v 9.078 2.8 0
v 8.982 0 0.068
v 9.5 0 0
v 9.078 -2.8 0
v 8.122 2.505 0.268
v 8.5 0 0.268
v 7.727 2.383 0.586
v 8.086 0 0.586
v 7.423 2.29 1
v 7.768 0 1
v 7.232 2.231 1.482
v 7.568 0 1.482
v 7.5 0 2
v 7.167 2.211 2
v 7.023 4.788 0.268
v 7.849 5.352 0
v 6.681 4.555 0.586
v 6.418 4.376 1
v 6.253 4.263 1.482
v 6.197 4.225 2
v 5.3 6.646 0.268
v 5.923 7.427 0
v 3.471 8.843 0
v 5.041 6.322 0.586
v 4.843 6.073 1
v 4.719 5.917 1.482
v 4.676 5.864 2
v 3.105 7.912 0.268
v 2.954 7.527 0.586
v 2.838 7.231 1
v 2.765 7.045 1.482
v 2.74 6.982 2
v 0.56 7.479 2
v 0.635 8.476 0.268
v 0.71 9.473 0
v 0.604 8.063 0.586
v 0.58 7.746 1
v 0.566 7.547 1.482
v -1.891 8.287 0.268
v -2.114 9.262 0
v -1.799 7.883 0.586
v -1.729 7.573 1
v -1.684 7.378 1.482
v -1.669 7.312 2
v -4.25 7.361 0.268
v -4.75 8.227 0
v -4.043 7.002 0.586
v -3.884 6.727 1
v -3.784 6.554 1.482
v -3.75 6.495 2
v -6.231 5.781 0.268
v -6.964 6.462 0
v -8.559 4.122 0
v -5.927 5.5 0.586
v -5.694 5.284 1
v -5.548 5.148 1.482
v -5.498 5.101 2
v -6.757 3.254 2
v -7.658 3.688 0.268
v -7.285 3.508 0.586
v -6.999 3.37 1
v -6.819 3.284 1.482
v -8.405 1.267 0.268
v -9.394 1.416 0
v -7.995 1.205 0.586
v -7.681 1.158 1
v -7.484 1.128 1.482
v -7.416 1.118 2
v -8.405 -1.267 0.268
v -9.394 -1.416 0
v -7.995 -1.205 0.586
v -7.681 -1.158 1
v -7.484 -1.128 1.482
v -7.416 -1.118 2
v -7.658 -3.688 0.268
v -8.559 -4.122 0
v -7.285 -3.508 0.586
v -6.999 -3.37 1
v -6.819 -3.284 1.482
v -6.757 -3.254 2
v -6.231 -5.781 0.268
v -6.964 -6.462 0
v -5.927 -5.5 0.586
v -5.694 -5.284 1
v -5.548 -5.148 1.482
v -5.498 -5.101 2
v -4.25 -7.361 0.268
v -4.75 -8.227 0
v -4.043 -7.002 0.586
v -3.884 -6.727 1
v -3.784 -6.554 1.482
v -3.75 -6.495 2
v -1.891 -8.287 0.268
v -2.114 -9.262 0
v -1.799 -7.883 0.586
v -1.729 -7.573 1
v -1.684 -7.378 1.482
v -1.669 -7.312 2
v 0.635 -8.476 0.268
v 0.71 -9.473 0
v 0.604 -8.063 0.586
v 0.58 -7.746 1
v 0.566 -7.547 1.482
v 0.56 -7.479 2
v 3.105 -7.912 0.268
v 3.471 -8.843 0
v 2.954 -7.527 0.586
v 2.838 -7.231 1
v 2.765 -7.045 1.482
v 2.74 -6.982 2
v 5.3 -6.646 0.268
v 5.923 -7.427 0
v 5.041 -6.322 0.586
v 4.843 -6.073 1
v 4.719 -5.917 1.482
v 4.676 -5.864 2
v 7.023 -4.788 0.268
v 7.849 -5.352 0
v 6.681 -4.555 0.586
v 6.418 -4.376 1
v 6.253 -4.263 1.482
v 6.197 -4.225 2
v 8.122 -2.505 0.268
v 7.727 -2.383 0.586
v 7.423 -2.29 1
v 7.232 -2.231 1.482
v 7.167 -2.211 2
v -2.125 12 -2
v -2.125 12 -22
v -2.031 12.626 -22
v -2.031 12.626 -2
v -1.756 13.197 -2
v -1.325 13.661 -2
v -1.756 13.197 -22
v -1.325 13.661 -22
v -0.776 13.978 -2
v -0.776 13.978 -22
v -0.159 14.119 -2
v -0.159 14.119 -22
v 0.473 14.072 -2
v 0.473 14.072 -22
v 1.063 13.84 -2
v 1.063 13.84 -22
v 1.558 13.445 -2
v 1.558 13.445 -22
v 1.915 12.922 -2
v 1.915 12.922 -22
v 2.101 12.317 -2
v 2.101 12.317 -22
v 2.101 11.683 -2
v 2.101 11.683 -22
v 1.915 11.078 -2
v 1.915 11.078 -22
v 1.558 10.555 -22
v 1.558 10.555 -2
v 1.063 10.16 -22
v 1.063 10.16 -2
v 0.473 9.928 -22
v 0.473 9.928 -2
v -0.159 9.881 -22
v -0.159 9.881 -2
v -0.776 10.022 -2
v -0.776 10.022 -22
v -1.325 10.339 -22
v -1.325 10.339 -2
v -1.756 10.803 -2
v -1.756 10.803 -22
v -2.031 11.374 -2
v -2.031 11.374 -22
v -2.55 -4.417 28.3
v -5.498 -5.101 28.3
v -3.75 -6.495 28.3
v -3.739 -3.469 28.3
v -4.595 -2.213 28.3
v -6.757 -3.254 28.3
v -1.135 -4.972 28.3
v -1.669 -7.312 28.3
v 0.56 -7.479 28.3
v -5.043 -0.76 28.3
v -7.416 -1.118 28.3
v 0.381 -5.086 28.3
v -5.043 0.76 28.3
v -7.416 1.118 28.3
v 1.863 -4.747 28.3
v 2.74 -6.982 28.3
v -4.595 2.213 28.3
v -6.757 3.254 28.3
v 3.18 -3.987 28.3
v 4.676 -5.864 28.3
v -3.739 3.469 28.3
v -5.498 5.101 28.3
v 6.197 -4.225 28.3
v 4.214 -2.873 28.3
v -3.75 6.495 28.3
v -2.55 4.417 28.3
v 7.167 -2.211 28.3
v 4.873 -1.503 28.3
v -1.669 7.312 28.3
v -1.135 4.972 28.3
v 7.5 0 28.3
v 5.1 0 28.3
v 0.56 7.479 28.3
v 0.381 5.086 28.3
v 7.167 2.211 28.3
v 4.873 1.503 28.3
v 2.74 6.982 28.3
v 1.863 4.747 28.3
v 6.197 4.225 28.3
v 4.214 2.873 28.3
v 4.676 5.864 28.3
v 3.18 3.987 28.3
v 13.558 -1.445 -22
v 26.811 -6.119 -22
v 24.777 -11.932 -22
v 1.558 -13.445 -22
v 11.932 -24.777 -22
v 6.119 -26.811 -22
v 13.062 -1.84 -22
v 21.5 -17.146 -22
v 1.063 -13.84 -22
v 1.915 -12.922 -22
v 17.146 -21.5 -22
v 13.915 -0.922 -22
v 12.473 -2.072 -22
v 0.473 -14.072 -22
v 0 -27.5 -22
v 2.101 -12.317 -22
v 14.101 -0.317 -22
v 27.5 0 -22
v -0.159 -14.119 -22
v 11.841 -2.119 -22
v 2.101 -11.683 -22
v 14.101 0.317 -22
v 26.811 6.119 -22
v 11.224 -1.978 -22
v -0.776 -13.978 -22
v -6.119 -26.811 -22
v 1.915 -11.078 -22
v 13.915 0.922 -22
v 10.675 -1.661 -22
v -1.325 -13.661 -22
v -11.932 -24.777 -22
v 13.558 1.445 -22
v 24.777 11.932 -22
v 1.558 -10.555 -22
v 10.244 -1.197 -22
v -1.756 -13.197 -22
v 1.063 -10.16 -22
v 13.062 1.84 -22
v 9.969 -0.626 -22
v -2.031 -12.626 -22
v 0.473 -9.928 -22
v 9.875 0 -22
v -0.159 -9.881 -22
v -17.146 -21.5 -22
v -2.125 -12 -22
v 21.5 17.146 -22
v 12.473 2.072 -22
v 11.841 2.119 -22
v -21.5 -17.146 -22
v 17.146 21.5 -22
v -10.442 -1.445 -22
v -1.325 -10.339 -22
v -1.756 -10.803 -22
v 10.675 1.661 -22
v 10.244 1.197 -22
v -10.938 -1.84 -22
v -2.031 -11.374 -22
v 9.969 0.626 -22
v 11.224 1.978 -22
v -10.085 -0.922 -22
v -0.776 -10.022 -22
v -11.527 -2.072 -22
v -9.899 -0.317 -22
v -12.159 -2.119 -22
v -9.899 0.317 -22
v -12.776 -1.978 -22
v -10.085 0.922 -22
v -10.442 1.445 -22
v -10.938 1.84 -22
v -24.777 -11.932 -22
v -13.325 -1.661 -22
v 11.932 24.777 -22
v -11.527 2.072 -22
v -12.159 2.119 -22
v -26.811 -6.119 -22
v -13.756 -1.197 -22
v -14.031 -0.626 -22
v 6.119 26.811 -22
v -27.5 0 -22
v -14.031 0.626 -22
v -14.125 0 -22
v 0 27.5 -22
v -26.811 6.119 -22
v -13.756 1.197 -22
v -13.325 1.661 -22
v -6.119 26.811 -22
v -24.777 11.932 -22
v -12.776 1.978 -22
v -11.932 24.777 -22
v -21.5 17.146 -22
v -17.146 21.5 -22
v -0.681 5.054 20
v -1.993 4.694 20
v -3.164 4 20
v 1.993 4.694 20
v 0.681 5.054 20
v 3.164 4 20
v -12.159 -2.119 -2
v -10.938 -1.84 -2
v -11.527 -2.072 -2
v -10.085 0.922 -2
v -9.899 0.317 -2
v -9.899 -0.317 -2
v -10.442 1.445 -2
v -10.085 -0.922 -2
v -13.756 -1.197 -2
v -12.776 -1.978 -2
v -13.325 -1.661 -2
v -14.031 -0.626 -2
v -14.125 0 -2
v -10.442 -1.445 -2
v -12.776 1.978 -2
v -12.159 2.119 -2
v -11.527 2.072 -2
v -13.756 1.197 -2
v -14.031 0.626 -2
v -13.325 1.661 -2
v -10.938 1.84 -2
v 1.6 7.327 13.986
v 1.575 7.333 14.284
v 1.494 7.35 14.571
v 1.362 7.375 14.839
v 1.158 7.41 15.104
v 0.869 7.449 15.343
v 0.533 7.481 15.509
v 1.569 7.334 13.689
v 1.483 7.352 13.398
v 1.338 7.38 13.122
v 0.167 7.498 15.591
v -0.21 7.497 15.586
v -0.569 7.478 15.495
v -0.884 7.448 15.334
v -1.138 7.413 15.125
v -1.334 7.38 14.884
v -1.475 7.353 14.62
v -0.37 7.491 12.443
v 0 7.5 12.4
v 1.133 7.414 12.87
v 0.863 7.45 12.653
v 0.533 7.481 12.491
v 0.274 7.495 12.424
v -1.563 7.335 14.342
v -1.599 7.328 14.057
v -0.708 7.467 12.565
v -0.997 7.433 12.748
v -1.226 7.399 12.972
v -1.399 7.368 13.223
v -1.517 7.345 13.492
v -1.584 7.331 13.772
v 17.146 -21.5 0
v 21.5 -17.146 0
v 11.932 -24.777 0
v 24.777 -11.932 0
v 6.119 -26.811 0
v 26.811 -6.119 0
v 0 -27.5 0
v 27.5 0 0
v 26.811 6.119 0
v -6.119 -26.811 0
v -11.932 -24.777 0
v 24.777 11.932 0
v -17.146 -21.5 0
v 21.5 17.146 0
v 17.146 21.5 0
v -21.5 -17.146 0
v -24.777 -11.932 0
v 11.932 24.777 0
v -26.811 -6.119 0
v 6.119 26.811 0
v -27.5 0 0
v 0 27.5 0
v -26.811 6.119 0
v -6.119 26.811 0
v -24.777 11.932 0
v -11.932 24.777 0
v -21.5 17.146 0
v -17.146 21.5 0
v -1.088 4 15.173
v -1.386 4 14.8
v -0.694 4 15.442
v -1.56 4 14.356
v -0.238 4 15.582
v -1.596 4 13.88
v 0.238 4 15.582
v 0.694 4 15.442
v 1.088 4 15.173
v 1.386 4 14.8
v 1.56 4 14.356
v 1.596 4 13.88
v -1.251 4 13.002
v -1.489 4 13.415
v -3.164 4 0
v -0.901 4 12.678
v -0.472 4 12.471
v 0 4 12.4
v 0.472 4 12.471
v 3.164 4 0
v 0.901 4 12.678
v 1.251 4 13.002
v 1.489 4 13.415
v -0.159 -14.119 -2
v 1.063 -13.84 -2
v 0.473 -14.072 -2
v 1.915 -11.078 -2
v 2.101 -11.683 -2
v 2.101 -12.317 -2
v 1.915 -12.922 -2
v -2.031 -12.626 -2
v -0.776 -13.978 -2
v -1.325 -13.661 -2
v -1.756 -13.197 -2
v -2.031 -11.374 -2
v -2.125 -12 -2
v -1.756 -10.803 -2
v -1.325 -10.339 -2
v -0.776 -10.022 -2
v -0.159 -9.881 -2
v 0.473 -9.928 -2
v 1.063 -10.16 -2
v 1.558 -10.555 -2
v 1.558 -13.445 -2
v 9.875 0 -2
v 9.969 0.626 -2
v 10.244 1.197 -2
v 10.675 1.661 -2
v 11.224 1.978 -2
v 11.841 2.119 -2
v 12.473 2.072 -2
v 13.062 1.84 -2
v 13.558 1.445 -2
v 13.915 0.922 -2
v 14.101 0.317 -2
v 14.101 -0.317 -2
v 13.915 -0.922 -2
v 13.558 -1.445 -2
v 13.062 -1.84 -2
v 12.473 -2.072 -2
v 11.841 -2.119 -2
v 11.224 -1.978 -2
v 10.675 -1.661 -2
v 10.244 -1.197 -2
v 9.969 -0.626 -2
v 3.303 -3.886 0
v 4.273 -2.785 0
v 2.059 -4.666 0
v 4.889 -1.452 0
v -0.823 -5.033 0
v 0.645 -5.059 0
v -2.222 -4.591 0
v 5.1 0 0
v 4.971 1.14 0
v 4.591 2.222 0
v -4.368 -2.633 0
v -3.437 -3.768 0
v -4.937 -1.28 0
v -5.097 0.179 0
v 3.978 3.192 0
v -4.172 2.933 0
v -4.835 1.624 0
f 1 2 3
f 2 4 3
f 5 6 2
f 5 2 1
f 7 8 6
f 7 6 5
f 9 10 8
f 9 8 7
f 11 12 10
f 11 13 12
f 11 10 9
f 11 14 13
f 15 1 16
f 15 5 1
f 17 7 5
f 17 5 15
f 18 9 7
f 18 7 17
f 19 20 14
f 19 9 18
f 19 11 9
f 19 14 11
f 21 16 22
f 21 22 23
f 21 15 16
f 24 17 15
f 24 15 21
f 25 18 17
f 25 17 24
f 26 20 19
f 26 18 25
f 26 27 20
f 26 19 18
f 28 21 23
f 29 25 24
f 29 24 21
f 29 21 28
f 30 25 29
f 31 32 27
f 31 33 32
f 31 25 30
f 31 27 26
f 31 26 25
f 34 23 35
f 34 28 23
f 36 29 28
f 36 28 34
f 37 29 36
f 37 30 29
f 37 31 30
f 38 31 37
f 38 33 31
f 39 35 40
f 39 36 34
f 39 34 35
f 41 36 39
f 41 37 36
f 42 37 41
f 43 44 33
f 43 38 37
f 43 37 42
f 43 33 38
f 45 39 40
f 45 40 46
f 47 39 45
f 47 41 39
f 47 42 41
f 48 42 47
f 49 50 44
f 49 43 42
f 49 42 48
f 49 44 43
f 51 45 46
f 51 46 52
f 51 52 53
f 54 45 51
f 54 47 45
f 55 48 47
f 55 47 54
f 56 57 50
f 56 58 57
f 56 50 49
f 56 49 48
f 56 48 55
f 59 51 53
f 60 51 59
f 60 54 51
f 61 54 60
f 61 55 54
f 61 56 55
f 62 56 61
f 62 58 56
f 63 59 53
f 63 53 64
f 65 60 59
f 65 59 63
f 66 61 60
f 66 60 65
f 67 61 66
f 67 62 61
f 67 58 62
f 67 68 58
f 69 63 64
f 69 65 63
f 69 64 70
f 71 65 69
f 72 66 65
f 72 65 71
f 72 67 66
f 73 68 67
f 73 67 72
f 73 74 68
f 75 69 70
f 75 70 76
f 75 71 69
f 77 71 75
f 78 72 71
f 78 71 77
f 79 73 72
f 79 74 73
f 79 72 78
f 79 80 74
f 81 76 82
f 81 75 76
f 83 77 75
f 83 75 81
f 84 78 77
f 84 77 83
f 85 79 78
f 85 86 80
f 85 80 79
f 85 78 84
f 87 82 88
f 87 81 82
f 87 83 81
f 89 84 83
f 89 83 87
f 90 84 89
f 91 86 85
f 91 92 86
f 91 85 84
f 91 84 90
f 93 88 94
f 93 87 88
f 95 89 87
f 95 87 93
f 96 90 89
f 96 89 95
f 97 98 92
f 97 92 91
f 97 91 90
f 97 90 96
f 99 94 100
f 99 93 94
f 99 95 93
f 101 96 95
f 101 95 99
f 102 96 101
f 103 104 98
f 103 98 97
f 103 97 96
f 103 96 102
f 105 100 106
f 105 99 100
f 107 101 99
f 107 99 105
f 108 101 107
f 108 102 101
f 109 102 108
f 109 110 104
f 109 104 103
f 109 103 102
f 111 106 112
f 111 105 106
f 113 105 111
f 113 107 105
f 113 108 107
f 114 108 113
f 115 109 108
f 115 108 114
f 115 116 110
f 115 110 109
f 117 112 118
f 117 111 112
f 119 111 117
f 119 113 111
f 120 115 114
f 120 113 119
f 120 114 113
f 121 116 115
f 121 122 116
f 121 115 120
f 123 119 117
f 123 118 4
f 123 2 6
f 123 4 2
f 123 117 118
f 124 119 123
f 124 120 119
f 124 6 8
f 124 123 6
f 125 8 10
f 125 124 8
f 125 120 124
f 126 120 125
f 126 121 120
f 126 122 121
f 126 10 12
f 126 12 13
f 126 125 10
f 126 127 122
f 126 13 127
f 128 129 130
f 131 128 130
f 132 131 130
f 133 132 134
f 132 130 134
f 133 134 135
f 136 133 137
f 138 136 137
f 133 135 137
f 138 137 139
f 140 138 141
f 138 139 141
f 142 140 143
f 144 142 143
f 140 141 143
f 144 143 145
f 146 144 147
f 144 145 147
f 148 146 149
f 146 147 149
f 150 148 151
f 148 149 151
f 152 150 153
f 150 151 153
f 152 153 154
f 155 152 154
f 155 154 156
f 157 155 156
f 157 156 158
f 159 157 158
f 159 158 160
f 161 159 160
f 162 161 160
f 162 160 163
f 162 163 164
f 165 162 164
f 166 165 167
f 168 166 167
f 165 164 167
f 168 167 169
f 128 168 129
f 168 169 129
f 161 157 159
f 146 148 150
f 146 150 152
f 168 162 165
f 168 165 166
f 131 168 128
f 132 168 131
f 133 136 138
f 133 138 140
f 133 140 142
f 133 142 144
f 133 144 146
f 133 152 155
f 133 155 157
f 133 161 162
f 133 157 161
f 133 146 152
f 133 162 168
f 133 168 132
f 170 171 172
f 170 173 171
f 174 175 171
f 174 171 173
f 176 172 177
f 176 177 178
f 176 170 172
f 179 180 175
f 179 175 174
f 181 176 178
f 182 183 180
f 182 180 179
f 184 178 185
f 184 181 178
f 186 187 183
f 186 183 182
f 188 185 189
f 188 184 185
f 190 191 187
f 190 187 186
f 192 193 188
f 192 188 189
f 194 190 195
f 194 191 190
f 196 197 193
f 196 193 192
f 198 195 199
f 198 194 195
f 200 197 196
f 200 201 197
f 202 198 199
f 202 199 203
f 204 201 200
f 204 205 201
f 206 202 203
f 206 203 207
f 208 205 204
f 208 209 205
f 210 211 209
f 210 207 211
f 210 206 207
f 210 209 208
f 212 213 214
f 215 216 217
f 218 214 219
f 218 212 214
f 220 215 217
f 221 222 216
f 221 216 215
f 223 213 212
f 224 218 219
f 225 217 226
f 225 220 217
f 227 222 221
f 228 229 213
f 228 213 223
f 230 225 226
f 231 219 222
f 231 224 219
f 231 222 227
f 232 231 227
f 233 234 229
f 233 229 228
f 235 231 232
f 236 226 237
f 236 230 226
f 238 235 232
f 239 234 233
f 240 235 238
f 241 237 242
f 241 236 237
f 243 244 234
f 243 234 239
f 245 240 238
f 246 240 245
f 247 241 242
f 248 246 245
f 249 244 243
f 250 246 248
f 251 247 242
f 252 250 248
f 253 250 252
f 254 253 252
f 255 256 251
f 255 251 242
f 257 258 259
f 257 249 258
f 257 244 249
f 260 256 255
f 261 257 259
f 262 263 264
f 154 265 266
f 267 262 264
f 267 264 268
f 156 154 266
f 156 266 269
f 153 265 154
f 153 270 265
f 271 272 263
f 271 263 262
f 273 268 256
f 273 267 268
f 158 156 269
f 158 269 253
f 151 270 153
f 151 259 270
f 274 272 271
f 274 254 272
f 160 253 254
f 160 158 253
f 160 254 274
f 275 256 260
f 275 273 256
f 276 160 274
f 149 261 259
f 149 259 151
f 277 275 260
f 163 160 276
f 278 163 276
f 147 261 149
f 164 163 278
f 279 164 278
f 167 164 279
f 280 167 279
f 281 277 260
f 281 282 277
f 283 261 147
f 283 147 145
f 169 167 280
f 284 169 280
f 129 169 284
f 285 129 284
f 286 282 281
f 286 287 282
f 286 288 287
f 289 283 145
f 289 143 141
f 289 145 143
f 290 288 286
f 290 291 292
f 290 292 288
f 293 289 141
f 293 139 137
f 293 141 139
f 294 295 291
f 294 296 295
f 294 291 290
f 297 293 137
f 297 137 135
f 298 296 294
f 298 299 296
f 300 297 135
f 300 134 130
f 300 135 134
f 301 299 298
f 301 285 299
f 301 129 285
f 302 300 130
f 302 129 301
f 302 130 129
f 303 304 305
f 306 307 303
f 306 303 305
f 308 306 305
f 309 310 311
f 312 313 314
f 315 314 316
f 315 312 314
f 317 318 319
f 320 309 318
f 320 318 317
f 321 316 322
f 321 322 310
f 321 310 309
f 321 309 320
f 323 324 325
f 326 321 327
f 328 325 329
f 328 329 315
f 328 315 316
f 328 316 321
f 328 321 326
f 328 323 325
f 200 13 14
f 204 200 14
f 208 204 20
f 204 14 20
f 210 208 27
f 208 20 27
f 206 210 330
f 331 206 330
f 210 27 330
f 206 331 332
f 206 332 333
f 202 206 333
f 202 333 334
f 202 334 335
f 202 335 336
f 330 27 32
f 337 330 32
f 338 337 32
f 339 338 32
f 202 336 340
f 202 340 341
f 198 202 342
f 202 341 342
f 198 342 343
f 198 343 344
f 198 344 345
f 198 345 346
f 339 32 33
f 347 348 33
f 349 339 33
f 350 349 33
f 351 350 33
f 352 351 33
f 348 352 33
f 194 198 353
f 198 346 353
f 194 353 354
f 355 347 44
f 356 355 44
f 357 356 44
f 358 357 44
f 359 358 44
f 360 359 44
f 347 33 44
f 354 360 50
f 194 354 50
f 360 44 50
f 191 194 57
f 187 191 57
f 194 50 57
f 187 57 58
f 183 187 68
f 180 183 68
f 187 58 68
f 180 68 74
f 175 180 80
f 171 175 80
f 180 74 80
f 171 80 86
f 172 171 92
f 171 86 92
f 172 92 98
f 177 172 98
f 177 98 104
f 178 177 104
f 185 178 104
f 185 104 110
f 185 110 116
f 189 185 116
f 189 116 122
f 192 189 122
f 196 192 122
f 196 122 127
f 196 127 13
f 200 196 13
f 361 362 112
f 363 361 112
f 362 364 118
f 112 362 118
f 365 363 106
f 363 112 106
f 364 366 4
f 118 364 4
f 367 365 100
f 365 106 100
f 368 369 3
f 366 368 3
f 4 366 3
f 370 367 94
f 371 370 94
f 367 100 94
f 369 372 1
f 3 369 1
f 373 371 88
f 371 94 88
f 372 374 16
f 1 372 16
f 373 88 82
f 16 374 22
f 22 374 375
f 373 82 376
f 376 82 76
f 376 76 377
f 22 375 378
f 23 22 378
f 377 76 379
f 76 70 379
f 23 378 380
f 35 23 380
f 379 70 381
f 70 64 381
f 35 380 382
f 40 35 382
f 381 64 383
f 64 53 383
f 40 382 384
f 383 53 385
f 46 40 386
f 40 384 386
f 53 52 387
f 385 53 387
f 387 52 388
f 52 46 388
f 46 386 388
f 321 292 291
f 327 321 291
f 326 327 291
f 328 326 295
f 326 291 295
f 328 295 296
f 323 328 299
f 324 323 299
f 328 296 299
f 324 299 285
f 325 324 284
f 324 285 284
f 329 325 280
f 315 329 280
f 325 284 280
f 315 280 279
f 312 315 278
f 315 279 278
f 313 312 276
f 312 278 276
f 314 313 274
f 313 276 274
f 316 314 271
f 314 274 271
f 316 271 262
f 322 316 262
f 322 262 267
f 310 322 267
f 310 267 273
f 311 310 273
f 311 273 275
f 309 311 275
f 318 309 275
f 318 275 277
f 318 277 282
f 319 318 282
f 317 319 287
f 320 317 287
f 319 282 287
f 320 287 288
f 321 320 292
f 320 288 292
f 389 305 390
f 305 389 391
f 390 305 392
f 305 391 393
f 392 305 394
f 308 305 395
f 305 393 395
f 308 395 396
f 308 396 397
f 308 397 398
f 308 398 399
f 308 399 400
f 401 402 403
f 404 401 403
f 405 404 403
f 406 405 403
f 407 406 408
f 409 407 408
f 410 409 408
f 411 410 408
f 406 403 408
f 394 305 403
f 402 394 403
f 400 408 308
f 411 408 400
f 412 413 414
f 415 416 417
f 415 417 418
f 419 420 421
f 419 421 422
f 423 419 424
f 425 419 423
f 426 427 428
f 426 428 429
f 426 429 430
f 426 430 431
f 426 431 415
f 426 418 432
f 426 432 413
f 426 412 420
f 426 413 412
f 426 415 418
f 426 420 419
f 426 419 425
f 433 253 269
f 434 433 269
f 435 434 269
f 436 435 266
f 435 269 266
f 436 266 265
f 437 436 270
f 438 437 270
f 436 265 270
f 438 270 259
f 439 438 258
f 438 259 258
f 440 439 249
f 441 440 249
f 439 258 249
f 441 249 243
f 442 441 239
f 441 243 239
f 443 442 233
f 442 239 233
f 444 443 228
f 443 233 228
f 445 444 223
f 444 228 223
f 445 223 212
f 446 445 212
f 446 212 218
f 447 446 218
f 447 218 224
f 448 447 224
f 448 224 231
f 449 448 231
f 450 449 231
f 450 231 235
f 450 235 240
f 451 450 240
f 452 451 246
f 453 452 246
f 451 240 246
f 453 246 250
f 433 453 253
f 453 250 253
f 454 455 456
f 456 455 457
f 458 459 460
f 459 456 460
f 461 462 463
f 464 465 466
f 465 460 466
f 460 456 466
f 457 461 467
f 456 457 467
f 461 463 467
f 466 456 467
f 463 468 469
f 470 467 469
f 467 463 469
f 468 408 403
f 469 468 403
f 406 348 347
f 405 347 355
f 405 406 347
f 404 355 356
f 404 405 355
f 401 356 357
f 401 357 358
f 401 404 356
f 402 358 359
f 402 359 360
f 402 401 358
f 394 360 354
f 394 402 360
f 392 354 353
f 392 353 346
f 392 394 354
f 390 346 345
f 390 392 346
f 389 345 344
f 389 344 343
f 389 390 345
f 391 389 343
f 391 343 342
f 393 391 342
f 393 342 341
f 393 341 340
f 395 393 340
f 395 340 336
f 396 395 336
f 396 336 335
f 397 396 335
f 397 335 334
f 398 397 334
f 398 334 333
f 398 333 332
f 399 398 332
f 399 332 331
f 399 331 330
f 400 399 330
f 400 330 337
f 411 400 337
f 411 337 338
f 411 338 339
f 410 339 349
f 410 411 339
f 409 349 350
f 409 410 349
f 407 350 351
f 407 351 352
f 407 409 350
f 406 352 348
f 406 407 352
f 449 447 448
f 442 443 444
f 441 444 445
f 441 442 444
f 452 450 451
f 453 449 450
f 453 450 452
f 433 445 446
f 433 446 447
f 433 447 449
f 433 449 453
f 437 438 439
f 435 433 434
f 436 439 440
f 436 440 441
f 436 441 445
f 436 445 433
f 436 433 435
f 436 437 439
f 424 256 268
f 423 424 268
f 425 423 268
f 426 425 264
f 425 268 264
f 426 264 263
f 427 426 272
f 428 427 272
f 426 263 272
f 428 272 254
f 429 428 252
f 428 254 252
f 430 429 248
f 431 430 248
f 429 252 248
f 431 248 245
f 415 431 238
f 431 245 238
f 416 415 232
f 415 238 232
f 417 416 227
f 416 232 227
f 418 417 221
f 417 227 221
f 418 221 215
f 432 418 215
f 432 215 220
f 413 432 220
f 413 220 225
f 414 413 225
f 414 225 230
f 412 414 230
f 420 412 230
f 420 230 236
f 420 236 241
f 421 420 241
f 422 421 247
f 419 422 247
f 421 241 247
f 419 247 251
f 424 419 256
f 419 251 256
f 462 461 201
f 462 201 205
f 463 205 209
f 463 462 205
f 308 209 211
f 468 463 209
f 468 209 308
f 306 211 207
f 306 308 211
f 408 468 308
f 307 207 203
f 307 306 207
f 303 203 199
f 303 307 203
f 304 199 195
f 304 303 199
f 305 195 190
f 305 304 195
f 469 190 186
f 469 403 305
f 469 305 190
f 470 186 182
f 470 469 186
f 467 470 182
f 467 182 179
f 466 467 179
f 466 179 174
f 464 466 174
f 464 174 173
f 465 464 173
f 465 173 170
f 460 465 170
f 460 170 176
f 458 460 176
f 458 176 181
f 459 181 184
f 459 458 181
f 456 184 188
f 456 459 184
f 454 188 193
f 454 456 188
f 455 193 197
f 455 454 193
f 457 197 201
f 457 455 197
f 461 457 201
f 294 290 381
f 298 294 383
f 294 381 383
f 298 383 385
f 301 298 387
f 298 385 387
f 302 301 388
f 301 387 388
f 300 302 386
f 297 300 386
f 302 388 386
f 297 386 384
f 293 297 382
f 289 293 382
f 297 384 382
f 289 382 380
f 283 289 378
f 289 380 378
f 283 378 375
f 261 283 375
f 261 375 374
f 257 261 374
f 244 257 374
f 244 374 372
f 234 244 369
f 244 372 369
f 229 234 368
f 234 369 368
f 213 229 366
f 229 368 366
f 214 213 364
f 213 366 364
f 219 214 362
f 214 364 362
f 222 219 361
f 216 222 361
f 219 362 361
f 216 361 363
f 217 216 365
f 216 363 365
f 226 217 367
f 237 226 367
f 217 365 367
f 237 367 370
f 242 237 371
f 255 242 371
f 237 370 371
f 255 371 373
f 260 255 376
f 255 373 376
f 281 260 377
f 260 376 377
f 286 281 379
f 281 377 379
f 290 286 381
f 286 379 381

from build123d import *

# Parameters (mm, degrees)
SKETCH1_R           = 7.5
SKETCH1_R_2         = 5.1
BOSS_EXTRUDE1_DEPTH = 28.3
SKETCH4_R           = 27.5
BOSS_EXTRUDE3_DEPTH = 22
FILLET1_R           = 2
SKETCH5_R           = 2.125
CUT_EXTRUDE2_DEPTH  = 20
BOSS_EXTRUDE4_DEPTH = 20
SKETCH7_R           = 1.6
CUT_EXTRUDE3_DEPTH  = 15


with BuildPart() as part:
    # Sketch1 → Boss-Extrude1 (new body)
    with BuildSketch(Plane.XY):
        Circle(SKETCH1_R)
        Circle(SKETCH1_R_2, mode=Mode.SUBTRACT)
    extrude(amount=BOSS_EXTRUDE1_DEPTH)

    # Sketch4 → Boss-Extrude3 (add)
    with BuildSketch(Plane(origin=(0, 0, 0), x_dir=(-1, 0, 0), z_dir=(0, 0, -1))):
        Circle(SKETCH4_R)
    extrude(amount=BOSS_EXTRUDE3_DEPTH)

    # Fillet1
    fillet1_edges = [part.edges().sort_by_distance(p)[0] for p in [
        (-7.5, 0, 0),
    ]]
    fillet(fillet1_edges, radius=FILLET1_R)

    # Sketch5 → Cut-Extrude2 (cut)
    with BuildSketch(Plane(origin=(0, 0, -22), x_dir=(-1, 0, 0), z_dir=(0, 0, -1))):
        with Locations((0, 12)):
            Circle(SKETCH5_R)
        with Locations((12, 0)):
            Circle(SKETCH5_R)
        with Locations((0, -12)):
            Circle(SKETCH5_R)
        with Locations((-12, 0)):
            Circle(SKETCH5_R)
    extrude(amount=-CUT_EXTRUDE2_DEPTH, mode=Mode.SUBTRACT)

    # Sketch6 → Boss-Extrude4 (add)
    with BuildSketch(Plane.XY):
        with BuildLine():
            ThreePointArc((3.163858404, 4), (0, 5.1), (-3.163858404, 4))
            Line((-3.163858404, 4), (3.163858404, 4))
        make_face()
    extrude(amount=BOSS_EXTRUDE4_DEPTH)

    # Sketch7 → Cut-Extrude3 (cut)
    with BuildSketch(Plane(origin=(0, 0, 0), x_dir=(1, 0, 0), z_dir=(0, 1, 0))):
        with Locations(Location((0, -14, 0), (0, 0, 90))):
            Circle(SKETCH7_R)
    extrude(amount=CUT_EXTRUDE3_DEPTH, mode=Mode.SUBTRACT)


solid = part.part
